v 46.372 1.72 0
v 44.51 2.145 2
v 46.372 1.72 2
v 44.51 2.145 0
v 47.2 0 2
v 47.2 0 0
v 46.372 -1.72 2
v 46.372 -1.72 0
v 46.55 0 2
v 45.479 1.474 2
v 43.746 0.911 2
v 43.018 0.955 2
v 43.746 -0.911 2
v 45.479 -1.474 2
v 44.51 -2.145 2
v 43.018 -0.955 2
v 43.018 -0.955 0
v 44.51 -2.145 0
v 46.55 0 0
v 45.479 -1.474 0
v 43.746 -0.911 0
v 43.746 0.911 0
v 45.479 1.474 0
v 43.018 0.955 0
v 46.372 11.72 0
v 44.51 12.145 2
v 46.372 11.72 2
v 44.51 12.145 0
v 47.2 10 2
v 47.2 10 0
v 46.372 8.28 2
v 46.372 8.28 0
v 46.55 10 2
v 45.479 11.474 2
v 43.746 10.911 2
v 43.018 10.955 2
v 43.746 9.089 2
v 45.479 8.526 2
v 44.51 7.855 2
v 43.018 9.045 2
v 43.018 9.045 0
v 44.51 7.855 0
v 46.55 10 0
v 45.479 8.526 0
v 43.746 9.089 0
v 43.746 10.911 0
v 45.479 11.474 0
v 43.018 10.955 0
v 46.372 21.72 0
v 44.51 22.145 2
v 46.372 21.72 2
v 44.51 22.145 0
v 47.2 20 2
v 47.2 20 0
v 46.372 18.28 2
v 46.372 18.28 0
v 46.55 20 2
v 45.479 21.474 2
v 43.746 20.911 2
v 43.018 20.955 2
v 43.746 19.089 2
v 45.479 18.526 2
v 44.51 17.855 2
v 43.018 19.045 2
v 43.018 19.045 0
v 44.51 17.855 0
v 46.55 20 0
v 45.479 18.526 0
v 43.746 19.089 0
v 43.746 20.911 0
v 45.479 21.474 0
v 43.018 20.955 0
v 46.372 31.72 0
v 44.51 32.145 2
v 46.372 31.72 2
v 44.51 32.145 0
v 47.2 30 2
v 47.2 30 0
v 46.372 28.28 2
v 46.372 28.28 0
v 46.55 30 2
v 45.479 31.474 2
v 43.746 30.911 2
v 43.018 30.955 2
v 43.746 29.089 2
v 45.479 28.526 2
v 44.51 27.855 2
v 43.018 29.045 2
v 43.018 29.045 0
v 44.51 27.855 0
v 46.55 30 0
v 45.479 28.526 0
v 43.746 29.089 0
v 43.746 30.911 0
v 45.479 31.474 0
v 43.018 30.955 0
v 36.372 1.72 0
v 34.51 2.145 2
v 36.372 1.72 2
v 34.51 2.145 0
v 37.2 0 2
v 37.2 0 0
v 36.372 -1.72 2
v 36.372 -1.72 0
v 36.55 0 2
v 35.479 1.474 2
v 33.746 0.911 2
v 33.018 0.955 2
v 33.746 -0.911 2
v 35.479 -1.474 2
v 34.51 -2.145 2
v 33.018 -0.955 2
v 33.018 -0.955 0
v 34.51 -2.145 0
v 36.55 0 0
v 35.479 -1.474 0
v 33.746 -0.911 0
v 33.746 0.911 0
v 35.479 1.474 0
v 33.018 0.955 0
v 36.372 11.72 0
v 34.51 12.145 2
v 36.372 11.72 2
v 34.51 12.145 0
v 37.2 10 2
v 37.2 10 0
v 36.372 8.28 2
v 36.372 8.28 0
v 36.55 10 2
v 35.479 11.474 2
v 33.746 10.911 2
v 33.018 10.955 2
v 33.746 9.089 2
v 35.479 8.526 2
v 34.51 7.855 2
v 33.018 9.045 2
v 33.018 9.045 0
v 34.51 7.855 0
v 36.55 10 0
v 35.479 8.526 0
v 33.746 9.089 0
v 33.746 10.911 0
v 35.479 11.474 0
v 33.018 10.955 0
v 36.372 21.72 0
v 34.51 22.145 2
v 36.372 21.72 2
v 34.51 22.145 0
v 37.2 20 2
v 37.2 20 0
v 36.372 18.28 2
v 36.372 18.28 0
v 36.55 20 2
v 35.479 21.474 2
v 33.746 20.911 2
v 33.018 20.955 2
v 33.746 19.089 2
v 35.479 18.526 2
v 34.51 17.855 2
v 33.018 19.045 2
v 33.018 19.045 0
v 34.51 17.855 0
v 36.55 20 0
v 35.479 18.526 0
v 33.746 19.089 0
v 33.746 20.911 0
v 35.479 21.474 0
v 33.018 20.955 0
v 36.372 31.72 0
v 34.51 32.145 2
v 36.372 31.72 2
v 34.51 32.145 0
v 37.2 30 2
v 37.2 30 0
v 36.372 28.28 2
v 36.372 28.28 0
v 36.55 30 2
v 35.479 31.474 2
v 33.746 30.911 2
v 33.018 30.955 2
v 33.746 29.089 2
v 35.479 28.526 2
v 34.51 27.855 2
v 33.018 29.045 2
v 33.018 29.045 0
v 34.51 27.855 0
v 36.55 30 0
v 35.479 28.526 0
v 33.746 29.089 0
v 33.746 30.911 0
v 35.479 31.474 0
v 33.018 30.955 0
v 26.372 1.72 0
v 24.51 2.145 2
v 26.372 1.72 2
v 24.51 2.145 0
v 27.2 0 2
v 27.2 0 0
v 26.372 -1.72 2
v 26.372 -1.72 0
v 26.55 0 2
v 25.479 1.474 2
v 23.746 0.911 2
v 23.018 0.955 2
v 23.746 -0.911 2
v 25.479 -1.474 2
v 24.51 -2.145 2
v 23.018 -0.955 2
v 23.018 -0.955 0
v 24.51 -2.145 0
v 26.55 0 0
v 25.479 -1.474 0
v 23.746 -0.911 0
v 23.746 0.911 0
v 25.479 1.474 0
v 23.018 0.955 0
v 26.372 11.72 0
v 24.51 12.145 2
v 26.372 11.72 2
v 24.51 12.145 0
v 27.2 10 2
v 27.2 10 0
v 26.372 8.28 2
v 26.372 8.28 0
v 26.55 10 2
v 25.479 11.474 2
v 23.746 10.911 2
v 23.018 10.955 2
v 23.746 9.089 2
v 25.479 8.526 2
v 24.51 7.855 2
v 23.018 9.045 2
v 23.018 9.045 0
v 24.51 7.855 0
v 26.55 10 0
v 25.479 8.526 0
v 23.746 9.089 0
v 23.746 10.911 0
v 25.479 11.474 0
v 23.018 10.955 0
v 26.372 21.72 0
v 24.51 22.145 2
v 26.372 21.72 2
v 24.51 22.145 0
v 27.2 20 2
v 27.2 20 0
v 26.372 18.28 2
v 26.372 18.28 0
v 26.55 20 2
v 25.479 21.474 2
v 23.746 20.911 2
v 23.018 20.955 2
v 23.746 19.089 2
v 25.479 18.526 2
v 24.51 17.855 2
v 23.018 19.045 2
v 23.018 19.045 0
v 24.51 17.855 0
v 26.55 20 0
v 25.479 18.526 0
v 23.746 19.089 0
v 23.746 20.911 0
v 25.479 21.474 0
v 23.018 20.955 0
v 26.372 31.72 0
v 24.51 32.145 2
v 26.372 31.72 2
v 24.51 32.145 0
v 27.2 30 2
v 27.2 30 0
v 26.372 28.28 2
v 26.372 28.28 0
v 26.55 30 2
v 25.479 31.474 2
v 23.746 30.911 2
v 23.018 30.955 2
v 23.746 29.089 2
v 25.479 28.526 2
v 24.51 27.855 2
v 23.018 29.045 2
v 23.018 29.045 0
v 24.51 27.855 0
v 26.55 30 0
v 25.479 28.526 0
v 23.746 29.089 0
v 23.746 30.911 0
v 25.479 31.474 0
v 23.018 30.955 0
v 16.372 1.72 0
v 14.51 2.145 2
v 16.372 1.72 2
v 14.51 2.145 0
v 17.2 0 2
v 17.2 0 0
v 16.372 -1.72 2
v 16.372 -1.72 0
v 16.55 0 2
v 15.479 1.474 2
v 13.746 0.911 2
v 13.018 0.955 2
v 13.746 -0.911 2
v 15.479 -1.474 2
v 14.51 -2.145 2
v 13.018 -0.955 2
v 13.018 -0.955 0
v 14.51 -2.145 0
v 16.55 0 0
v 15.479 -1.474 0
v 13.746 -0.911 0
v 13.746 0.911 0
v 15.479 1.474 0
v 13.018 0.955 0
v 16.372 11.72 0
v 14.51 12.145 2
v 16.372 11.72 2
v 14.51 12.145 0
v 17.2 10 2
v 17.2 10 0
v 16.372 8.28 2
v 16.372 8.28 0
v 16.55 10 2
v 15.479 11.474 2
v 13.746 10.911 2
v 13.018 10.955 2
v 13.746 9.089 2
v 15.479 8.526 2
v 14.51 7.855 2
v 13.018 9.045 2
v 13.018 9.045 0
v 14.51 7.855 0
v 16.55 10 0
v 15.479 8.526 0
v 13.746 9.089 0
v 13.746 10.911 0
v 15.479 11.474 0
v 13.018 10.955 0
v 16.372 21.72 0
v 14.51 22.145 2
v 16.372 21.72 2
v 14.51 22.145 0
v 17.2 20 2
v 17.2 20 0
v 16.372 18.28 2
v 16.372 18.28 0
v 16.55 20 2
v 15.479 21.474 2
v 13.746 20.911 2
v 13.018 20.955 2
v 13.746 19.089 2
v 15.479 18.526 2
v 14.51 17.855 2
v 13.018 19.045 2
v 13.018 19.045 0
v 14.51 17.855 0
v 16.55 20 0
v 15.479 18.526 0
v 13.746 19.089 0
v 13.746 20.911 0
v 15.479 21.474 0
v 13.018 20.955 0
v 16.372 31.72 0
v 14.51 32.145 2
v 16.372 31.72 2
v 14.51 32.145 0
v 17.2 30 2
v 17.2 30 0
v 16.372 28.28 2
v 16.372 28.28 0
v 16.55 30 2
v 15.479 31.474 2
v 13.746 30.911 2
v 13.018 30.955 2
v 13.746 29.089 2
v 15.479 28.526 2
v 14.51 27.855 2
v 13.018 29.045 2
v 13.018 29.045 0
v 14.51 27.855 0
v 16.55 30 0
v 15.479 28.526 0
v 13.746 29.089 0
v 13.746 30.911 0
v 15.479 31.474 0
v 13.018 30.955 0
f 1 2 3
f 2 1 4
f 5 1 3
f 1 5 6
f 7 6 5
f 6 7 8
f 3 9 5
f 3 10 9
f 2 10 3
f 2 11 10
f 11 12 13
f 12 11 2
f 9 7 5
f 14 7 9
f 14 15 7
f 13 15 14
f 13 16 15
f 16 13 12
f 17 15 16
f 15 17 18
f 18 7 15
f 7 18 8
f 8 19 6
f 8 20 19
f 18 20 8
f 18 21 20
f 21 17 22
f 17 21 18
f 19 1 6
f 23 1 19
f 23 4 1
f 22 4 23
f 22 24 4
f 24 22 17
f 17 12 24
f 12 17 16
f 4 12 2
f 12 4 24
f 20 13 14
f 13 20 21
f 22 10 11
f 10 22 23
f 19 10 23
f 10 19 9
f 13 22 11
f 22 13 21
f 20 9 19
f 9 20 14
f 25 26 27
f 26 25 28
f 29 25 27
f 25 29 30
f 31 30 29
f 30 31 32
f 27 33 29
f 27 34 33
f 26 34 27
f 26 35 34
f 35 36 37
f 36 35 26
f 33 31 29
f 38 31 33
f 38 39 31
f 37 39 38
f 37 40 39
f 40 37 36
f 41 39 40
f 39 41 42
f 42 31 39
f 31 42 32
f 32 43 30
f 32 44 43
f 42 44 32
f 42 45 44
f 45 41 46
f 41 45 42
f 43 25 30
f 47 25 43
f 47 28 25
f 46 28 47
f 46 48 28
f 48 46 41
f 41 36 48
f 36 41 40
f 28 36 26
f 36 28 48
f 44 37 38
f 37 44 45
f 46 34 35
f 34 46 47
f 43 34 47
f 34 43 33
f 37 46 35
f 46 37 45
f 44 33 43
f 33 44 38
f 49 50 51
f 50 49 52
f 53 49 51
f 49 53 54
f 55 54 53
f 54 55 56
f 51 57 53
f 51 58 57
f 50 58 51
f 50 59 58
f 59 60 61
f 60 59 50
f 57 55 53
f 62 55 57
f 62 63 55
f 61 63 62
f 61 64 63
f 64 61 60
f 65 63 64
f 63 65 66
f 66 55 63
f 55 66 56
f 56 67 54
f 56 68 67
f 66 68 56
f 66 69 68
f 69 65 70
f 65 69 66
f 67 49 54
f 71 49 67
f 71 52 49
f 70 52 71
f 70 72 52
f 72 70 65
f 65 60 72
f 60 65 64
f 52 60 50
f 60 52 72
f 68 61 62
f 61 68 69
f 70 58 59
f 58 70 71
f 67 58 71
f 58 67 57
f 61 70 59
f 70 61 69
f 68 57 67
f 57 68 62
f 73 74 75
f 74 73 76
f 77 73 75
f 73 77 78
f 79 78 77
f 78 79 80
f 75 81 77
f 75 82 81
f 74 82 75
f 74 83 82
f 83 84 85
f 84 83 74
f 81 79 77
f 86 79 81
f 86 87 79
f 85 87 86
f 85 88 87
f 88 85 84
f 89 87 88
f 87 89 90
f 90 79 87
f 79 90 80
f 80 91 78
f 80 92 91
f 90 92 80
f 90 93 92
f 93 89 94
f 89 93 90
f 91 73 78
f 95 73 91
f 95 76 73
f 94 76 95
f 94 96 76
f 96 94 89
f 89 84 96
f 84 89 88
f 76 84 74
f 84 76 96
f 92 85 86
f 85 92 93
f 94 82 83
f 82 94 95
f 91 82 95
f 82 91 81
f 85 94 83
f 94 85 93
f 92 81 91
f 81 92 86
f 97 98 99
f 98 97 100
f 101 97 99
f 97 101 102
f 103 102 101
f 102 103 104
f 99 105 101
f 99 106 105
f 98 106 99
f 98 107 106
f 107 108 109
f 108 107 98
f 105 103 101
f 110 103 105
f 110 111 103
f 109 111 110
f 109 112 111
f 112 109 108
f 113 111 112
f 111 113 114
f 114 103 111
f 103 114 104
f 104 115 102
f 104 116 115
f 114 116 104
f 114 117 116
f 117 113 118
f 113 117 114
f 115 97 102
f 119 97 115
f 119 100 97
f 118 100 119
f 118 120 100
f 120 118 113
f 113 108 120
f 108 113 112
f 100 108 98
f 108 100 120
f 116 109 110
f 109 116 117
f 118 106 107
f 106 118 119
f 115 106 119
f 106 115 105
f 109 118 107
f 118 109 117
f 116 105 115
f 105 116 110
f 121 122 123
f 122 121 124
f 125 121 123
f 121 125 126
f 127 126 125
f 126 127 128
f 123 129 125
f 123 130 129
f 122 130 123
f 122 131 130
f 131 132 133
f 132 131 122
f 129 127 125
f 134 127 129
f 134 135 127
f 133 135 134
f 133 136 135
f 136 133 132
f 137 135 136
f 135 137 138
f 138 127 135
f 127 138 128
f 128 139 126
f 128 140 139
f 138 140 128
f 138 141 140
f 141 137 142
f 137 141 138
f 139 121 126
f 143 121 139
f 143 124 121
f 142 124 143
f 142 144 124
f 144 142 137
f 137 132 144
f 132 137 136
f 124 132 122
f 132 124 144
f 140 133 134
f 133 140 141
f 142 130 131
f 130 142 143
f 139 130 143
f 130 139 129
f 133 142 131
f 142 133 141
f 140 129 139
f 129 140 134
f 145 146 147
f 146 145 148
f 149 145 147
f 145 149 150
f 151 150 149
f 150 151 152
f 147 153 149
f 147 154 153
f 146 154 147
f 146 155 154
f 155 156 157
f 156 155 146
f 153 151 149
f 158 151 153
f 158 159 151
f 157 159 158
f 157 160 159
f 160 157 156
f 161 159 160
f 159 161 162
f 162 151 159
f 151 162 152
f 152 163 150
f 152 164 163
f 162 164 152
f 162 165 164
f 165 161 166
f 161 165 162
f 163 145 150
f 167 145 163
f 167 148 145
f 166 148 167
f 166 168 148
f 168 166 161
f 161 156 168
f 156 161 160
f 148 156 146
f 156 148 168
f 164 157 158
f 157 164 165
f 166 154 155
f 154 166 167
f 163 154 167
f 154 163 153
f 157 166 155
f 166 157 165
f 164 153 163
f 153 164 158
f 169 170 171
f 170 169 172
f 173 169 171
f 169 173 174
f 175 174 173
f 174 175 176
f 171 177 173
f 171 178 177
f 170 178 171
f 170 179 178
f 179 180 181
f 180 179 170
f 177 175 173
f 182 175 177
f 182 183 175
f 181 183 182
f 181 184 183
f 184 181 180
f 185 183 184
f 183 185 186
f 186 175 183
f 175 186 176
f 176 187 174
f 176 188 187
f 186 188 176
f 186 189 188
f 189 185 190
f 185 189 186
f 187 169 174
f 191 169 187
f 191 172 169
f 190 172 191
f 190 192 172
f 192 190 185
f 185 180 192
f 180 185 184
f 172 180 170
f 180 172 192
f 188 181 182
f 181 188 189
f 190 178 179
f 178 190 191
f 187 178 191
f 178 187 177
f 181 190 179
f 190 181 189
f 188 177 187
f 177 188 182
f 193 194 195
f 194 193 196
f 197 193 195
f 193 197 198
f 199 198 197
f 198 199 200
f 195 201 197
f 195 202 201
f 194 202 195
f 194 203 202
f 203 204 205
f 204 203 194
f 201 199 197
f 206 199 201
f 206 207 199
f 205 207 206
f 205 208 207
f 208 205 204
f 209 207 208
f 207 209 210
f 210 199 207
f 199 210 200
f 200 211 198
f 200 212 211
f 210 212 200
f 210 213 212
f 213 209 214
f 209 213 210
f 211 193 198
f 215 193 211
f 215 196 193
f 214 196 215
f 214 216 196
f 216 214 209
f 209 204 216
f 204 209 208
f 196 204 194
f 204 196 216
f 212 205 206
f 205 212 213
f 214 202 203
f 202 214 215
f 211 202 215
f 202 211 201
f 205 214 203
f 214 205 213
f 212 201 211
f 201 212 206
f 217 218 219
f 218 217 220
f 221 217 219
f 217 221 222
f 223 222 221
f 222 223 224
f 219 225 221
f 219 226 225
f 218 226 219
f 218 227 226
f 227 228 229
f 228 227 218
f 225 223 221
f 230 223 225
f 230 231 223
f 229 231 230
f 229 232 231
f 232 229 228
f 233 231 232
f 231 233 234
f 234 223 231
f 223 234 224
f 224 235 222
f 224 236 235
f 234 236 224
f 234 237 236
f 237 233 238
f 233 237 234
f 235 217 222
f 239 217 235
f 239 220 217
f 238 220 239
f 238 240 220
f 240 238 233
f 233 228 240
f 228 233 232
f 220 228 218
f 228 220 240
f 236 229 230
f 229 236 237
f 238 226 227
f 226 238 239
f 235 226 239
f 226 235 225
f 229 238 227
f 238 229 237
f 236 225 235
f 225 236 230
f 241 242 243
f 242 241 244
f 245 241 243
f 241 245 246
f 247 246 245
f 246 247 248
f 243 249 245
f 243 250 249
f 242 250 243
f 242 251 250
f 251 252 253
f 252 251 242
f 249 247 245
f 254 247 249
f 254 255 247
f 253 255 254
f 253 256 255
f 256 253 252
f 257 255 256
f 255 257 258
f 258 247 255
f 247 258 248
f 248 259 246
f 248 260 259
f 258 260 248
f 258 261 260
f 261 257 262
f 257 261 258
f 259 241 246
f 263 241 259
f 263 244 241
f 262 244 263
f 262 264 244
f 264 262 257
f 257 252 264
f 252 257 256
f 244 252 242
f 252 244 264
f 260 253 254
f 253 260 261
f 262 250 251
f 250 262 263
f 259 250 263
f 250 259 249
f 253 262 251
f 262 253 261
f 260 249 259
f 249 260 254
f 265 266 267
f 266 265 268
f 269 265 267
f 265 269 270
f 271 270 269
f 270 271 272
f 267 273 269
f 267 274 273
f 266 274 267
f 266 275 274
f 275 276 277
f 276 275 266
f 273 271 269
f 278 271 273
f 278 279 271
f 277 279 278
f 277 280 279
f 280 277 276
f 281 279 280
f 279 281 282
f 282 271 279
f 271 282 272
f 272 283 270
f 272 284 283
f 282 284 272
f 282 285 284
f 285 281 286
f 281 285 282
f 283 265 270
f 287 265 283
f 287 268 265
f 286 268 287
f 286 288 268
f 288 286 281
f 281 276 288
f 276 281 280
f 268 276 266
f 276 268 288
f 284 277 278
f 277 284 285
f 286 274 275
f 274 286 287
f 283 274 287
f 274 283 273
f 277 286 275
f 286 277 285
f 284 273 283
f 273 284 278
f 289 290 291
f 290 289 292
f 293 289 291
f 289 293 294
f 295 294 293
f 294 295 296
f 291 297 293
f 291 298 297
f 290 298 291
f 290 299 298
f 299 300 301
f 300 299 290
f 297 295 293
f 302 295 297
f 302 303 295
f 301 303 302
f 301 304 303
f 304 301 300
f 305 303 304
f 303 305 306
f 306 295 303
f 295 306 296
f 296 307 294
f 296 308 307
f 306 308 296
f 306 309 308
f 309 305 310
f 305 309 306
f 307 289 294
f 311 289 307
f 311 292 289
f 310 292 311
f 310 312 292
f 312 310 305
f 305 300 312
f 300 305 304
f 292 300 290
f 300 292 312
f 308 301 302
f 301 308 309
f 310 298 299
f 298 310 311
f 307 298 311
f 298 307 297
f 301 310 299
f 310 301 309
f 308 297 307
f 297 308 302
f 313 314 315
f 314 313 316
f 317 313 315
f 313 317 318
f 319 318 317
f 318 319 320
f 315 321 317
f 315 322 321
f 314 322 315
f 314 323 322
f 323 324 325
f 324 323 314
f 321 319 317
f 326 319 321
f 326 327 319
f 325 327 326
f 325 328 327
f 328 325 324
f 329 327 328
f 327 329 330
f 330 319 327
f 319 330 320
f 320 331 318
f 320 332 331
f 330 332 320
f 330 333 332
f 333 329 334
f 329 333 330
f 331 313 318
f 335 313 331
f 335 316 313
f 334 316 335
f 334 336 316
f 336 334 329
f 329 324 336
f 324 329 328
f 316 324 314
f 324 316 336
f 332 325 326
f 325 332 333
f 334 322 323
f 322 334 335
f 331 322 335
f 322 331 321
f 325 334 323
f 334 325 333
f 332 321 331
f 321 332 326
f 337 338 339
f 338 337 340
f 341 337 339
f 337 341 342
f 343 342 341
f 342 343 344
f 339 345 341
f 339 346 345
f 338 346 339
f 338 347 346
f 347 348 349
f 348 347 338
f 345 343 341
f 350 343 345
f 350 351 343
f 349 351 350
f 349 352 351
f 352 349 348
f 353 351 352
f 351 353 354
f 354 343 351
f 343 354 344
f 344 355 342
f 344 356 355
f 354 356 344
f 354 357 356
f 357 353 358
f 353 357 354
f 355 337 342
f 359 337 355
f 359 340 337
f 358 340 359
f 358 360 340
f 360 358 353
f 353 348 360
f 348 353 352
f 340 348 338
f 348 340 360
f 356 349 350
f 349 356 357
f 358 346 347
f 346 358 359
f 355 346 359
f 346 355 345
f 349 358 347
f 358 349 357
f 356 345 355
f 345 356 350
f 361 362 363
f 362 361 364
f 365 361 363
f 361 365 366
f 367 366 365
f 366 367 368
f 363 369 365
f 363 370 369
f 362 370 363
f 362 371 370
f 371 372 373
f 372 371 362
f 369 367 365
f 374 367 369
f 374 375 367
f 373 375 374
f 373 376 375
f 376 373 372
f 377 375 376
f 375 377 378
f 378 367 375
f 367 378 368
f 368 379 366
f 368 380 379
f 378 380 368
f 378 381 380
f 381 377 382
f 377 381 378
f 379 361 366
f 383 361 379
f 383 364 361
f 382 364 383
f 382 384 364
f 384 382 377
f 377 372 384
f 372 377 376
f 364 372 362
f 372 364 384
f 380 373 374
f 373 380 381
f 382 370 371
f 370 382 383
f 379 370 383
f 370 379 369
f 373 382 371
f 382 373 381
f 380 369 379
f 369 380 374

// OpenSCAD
module standoff(ht)
{
        difference(){
                cylinder(r=2.2,h=ht);
        cylinder(r=1.55,h=ht+.2);
        }

}


translate([45,0,0]) standoff(2);
translate([45,10,0]) standoff(2);
translate([45,20,0]) standoff(2);
translate([45,30,0]) standoff(2);
translate([35,0,0]) standoff(2);
translate([35,10,0]) standoff(2);
translate([35,20,0]) standoff(2);
translate([35,30,0]) standoff(2);
translate([25,0,0]) standoff(2);
translate([25,10,0]) standoff(2);
translate([25,20,0]) standoff(2);
translate([25,30,0]) standoff(2);
translate([15,0,0]) standoff(2);
translate([15,10,0]) standoff(2);
translate([15,20,0]) standoff(2);
translate([15,30,0]) standoff(2);
